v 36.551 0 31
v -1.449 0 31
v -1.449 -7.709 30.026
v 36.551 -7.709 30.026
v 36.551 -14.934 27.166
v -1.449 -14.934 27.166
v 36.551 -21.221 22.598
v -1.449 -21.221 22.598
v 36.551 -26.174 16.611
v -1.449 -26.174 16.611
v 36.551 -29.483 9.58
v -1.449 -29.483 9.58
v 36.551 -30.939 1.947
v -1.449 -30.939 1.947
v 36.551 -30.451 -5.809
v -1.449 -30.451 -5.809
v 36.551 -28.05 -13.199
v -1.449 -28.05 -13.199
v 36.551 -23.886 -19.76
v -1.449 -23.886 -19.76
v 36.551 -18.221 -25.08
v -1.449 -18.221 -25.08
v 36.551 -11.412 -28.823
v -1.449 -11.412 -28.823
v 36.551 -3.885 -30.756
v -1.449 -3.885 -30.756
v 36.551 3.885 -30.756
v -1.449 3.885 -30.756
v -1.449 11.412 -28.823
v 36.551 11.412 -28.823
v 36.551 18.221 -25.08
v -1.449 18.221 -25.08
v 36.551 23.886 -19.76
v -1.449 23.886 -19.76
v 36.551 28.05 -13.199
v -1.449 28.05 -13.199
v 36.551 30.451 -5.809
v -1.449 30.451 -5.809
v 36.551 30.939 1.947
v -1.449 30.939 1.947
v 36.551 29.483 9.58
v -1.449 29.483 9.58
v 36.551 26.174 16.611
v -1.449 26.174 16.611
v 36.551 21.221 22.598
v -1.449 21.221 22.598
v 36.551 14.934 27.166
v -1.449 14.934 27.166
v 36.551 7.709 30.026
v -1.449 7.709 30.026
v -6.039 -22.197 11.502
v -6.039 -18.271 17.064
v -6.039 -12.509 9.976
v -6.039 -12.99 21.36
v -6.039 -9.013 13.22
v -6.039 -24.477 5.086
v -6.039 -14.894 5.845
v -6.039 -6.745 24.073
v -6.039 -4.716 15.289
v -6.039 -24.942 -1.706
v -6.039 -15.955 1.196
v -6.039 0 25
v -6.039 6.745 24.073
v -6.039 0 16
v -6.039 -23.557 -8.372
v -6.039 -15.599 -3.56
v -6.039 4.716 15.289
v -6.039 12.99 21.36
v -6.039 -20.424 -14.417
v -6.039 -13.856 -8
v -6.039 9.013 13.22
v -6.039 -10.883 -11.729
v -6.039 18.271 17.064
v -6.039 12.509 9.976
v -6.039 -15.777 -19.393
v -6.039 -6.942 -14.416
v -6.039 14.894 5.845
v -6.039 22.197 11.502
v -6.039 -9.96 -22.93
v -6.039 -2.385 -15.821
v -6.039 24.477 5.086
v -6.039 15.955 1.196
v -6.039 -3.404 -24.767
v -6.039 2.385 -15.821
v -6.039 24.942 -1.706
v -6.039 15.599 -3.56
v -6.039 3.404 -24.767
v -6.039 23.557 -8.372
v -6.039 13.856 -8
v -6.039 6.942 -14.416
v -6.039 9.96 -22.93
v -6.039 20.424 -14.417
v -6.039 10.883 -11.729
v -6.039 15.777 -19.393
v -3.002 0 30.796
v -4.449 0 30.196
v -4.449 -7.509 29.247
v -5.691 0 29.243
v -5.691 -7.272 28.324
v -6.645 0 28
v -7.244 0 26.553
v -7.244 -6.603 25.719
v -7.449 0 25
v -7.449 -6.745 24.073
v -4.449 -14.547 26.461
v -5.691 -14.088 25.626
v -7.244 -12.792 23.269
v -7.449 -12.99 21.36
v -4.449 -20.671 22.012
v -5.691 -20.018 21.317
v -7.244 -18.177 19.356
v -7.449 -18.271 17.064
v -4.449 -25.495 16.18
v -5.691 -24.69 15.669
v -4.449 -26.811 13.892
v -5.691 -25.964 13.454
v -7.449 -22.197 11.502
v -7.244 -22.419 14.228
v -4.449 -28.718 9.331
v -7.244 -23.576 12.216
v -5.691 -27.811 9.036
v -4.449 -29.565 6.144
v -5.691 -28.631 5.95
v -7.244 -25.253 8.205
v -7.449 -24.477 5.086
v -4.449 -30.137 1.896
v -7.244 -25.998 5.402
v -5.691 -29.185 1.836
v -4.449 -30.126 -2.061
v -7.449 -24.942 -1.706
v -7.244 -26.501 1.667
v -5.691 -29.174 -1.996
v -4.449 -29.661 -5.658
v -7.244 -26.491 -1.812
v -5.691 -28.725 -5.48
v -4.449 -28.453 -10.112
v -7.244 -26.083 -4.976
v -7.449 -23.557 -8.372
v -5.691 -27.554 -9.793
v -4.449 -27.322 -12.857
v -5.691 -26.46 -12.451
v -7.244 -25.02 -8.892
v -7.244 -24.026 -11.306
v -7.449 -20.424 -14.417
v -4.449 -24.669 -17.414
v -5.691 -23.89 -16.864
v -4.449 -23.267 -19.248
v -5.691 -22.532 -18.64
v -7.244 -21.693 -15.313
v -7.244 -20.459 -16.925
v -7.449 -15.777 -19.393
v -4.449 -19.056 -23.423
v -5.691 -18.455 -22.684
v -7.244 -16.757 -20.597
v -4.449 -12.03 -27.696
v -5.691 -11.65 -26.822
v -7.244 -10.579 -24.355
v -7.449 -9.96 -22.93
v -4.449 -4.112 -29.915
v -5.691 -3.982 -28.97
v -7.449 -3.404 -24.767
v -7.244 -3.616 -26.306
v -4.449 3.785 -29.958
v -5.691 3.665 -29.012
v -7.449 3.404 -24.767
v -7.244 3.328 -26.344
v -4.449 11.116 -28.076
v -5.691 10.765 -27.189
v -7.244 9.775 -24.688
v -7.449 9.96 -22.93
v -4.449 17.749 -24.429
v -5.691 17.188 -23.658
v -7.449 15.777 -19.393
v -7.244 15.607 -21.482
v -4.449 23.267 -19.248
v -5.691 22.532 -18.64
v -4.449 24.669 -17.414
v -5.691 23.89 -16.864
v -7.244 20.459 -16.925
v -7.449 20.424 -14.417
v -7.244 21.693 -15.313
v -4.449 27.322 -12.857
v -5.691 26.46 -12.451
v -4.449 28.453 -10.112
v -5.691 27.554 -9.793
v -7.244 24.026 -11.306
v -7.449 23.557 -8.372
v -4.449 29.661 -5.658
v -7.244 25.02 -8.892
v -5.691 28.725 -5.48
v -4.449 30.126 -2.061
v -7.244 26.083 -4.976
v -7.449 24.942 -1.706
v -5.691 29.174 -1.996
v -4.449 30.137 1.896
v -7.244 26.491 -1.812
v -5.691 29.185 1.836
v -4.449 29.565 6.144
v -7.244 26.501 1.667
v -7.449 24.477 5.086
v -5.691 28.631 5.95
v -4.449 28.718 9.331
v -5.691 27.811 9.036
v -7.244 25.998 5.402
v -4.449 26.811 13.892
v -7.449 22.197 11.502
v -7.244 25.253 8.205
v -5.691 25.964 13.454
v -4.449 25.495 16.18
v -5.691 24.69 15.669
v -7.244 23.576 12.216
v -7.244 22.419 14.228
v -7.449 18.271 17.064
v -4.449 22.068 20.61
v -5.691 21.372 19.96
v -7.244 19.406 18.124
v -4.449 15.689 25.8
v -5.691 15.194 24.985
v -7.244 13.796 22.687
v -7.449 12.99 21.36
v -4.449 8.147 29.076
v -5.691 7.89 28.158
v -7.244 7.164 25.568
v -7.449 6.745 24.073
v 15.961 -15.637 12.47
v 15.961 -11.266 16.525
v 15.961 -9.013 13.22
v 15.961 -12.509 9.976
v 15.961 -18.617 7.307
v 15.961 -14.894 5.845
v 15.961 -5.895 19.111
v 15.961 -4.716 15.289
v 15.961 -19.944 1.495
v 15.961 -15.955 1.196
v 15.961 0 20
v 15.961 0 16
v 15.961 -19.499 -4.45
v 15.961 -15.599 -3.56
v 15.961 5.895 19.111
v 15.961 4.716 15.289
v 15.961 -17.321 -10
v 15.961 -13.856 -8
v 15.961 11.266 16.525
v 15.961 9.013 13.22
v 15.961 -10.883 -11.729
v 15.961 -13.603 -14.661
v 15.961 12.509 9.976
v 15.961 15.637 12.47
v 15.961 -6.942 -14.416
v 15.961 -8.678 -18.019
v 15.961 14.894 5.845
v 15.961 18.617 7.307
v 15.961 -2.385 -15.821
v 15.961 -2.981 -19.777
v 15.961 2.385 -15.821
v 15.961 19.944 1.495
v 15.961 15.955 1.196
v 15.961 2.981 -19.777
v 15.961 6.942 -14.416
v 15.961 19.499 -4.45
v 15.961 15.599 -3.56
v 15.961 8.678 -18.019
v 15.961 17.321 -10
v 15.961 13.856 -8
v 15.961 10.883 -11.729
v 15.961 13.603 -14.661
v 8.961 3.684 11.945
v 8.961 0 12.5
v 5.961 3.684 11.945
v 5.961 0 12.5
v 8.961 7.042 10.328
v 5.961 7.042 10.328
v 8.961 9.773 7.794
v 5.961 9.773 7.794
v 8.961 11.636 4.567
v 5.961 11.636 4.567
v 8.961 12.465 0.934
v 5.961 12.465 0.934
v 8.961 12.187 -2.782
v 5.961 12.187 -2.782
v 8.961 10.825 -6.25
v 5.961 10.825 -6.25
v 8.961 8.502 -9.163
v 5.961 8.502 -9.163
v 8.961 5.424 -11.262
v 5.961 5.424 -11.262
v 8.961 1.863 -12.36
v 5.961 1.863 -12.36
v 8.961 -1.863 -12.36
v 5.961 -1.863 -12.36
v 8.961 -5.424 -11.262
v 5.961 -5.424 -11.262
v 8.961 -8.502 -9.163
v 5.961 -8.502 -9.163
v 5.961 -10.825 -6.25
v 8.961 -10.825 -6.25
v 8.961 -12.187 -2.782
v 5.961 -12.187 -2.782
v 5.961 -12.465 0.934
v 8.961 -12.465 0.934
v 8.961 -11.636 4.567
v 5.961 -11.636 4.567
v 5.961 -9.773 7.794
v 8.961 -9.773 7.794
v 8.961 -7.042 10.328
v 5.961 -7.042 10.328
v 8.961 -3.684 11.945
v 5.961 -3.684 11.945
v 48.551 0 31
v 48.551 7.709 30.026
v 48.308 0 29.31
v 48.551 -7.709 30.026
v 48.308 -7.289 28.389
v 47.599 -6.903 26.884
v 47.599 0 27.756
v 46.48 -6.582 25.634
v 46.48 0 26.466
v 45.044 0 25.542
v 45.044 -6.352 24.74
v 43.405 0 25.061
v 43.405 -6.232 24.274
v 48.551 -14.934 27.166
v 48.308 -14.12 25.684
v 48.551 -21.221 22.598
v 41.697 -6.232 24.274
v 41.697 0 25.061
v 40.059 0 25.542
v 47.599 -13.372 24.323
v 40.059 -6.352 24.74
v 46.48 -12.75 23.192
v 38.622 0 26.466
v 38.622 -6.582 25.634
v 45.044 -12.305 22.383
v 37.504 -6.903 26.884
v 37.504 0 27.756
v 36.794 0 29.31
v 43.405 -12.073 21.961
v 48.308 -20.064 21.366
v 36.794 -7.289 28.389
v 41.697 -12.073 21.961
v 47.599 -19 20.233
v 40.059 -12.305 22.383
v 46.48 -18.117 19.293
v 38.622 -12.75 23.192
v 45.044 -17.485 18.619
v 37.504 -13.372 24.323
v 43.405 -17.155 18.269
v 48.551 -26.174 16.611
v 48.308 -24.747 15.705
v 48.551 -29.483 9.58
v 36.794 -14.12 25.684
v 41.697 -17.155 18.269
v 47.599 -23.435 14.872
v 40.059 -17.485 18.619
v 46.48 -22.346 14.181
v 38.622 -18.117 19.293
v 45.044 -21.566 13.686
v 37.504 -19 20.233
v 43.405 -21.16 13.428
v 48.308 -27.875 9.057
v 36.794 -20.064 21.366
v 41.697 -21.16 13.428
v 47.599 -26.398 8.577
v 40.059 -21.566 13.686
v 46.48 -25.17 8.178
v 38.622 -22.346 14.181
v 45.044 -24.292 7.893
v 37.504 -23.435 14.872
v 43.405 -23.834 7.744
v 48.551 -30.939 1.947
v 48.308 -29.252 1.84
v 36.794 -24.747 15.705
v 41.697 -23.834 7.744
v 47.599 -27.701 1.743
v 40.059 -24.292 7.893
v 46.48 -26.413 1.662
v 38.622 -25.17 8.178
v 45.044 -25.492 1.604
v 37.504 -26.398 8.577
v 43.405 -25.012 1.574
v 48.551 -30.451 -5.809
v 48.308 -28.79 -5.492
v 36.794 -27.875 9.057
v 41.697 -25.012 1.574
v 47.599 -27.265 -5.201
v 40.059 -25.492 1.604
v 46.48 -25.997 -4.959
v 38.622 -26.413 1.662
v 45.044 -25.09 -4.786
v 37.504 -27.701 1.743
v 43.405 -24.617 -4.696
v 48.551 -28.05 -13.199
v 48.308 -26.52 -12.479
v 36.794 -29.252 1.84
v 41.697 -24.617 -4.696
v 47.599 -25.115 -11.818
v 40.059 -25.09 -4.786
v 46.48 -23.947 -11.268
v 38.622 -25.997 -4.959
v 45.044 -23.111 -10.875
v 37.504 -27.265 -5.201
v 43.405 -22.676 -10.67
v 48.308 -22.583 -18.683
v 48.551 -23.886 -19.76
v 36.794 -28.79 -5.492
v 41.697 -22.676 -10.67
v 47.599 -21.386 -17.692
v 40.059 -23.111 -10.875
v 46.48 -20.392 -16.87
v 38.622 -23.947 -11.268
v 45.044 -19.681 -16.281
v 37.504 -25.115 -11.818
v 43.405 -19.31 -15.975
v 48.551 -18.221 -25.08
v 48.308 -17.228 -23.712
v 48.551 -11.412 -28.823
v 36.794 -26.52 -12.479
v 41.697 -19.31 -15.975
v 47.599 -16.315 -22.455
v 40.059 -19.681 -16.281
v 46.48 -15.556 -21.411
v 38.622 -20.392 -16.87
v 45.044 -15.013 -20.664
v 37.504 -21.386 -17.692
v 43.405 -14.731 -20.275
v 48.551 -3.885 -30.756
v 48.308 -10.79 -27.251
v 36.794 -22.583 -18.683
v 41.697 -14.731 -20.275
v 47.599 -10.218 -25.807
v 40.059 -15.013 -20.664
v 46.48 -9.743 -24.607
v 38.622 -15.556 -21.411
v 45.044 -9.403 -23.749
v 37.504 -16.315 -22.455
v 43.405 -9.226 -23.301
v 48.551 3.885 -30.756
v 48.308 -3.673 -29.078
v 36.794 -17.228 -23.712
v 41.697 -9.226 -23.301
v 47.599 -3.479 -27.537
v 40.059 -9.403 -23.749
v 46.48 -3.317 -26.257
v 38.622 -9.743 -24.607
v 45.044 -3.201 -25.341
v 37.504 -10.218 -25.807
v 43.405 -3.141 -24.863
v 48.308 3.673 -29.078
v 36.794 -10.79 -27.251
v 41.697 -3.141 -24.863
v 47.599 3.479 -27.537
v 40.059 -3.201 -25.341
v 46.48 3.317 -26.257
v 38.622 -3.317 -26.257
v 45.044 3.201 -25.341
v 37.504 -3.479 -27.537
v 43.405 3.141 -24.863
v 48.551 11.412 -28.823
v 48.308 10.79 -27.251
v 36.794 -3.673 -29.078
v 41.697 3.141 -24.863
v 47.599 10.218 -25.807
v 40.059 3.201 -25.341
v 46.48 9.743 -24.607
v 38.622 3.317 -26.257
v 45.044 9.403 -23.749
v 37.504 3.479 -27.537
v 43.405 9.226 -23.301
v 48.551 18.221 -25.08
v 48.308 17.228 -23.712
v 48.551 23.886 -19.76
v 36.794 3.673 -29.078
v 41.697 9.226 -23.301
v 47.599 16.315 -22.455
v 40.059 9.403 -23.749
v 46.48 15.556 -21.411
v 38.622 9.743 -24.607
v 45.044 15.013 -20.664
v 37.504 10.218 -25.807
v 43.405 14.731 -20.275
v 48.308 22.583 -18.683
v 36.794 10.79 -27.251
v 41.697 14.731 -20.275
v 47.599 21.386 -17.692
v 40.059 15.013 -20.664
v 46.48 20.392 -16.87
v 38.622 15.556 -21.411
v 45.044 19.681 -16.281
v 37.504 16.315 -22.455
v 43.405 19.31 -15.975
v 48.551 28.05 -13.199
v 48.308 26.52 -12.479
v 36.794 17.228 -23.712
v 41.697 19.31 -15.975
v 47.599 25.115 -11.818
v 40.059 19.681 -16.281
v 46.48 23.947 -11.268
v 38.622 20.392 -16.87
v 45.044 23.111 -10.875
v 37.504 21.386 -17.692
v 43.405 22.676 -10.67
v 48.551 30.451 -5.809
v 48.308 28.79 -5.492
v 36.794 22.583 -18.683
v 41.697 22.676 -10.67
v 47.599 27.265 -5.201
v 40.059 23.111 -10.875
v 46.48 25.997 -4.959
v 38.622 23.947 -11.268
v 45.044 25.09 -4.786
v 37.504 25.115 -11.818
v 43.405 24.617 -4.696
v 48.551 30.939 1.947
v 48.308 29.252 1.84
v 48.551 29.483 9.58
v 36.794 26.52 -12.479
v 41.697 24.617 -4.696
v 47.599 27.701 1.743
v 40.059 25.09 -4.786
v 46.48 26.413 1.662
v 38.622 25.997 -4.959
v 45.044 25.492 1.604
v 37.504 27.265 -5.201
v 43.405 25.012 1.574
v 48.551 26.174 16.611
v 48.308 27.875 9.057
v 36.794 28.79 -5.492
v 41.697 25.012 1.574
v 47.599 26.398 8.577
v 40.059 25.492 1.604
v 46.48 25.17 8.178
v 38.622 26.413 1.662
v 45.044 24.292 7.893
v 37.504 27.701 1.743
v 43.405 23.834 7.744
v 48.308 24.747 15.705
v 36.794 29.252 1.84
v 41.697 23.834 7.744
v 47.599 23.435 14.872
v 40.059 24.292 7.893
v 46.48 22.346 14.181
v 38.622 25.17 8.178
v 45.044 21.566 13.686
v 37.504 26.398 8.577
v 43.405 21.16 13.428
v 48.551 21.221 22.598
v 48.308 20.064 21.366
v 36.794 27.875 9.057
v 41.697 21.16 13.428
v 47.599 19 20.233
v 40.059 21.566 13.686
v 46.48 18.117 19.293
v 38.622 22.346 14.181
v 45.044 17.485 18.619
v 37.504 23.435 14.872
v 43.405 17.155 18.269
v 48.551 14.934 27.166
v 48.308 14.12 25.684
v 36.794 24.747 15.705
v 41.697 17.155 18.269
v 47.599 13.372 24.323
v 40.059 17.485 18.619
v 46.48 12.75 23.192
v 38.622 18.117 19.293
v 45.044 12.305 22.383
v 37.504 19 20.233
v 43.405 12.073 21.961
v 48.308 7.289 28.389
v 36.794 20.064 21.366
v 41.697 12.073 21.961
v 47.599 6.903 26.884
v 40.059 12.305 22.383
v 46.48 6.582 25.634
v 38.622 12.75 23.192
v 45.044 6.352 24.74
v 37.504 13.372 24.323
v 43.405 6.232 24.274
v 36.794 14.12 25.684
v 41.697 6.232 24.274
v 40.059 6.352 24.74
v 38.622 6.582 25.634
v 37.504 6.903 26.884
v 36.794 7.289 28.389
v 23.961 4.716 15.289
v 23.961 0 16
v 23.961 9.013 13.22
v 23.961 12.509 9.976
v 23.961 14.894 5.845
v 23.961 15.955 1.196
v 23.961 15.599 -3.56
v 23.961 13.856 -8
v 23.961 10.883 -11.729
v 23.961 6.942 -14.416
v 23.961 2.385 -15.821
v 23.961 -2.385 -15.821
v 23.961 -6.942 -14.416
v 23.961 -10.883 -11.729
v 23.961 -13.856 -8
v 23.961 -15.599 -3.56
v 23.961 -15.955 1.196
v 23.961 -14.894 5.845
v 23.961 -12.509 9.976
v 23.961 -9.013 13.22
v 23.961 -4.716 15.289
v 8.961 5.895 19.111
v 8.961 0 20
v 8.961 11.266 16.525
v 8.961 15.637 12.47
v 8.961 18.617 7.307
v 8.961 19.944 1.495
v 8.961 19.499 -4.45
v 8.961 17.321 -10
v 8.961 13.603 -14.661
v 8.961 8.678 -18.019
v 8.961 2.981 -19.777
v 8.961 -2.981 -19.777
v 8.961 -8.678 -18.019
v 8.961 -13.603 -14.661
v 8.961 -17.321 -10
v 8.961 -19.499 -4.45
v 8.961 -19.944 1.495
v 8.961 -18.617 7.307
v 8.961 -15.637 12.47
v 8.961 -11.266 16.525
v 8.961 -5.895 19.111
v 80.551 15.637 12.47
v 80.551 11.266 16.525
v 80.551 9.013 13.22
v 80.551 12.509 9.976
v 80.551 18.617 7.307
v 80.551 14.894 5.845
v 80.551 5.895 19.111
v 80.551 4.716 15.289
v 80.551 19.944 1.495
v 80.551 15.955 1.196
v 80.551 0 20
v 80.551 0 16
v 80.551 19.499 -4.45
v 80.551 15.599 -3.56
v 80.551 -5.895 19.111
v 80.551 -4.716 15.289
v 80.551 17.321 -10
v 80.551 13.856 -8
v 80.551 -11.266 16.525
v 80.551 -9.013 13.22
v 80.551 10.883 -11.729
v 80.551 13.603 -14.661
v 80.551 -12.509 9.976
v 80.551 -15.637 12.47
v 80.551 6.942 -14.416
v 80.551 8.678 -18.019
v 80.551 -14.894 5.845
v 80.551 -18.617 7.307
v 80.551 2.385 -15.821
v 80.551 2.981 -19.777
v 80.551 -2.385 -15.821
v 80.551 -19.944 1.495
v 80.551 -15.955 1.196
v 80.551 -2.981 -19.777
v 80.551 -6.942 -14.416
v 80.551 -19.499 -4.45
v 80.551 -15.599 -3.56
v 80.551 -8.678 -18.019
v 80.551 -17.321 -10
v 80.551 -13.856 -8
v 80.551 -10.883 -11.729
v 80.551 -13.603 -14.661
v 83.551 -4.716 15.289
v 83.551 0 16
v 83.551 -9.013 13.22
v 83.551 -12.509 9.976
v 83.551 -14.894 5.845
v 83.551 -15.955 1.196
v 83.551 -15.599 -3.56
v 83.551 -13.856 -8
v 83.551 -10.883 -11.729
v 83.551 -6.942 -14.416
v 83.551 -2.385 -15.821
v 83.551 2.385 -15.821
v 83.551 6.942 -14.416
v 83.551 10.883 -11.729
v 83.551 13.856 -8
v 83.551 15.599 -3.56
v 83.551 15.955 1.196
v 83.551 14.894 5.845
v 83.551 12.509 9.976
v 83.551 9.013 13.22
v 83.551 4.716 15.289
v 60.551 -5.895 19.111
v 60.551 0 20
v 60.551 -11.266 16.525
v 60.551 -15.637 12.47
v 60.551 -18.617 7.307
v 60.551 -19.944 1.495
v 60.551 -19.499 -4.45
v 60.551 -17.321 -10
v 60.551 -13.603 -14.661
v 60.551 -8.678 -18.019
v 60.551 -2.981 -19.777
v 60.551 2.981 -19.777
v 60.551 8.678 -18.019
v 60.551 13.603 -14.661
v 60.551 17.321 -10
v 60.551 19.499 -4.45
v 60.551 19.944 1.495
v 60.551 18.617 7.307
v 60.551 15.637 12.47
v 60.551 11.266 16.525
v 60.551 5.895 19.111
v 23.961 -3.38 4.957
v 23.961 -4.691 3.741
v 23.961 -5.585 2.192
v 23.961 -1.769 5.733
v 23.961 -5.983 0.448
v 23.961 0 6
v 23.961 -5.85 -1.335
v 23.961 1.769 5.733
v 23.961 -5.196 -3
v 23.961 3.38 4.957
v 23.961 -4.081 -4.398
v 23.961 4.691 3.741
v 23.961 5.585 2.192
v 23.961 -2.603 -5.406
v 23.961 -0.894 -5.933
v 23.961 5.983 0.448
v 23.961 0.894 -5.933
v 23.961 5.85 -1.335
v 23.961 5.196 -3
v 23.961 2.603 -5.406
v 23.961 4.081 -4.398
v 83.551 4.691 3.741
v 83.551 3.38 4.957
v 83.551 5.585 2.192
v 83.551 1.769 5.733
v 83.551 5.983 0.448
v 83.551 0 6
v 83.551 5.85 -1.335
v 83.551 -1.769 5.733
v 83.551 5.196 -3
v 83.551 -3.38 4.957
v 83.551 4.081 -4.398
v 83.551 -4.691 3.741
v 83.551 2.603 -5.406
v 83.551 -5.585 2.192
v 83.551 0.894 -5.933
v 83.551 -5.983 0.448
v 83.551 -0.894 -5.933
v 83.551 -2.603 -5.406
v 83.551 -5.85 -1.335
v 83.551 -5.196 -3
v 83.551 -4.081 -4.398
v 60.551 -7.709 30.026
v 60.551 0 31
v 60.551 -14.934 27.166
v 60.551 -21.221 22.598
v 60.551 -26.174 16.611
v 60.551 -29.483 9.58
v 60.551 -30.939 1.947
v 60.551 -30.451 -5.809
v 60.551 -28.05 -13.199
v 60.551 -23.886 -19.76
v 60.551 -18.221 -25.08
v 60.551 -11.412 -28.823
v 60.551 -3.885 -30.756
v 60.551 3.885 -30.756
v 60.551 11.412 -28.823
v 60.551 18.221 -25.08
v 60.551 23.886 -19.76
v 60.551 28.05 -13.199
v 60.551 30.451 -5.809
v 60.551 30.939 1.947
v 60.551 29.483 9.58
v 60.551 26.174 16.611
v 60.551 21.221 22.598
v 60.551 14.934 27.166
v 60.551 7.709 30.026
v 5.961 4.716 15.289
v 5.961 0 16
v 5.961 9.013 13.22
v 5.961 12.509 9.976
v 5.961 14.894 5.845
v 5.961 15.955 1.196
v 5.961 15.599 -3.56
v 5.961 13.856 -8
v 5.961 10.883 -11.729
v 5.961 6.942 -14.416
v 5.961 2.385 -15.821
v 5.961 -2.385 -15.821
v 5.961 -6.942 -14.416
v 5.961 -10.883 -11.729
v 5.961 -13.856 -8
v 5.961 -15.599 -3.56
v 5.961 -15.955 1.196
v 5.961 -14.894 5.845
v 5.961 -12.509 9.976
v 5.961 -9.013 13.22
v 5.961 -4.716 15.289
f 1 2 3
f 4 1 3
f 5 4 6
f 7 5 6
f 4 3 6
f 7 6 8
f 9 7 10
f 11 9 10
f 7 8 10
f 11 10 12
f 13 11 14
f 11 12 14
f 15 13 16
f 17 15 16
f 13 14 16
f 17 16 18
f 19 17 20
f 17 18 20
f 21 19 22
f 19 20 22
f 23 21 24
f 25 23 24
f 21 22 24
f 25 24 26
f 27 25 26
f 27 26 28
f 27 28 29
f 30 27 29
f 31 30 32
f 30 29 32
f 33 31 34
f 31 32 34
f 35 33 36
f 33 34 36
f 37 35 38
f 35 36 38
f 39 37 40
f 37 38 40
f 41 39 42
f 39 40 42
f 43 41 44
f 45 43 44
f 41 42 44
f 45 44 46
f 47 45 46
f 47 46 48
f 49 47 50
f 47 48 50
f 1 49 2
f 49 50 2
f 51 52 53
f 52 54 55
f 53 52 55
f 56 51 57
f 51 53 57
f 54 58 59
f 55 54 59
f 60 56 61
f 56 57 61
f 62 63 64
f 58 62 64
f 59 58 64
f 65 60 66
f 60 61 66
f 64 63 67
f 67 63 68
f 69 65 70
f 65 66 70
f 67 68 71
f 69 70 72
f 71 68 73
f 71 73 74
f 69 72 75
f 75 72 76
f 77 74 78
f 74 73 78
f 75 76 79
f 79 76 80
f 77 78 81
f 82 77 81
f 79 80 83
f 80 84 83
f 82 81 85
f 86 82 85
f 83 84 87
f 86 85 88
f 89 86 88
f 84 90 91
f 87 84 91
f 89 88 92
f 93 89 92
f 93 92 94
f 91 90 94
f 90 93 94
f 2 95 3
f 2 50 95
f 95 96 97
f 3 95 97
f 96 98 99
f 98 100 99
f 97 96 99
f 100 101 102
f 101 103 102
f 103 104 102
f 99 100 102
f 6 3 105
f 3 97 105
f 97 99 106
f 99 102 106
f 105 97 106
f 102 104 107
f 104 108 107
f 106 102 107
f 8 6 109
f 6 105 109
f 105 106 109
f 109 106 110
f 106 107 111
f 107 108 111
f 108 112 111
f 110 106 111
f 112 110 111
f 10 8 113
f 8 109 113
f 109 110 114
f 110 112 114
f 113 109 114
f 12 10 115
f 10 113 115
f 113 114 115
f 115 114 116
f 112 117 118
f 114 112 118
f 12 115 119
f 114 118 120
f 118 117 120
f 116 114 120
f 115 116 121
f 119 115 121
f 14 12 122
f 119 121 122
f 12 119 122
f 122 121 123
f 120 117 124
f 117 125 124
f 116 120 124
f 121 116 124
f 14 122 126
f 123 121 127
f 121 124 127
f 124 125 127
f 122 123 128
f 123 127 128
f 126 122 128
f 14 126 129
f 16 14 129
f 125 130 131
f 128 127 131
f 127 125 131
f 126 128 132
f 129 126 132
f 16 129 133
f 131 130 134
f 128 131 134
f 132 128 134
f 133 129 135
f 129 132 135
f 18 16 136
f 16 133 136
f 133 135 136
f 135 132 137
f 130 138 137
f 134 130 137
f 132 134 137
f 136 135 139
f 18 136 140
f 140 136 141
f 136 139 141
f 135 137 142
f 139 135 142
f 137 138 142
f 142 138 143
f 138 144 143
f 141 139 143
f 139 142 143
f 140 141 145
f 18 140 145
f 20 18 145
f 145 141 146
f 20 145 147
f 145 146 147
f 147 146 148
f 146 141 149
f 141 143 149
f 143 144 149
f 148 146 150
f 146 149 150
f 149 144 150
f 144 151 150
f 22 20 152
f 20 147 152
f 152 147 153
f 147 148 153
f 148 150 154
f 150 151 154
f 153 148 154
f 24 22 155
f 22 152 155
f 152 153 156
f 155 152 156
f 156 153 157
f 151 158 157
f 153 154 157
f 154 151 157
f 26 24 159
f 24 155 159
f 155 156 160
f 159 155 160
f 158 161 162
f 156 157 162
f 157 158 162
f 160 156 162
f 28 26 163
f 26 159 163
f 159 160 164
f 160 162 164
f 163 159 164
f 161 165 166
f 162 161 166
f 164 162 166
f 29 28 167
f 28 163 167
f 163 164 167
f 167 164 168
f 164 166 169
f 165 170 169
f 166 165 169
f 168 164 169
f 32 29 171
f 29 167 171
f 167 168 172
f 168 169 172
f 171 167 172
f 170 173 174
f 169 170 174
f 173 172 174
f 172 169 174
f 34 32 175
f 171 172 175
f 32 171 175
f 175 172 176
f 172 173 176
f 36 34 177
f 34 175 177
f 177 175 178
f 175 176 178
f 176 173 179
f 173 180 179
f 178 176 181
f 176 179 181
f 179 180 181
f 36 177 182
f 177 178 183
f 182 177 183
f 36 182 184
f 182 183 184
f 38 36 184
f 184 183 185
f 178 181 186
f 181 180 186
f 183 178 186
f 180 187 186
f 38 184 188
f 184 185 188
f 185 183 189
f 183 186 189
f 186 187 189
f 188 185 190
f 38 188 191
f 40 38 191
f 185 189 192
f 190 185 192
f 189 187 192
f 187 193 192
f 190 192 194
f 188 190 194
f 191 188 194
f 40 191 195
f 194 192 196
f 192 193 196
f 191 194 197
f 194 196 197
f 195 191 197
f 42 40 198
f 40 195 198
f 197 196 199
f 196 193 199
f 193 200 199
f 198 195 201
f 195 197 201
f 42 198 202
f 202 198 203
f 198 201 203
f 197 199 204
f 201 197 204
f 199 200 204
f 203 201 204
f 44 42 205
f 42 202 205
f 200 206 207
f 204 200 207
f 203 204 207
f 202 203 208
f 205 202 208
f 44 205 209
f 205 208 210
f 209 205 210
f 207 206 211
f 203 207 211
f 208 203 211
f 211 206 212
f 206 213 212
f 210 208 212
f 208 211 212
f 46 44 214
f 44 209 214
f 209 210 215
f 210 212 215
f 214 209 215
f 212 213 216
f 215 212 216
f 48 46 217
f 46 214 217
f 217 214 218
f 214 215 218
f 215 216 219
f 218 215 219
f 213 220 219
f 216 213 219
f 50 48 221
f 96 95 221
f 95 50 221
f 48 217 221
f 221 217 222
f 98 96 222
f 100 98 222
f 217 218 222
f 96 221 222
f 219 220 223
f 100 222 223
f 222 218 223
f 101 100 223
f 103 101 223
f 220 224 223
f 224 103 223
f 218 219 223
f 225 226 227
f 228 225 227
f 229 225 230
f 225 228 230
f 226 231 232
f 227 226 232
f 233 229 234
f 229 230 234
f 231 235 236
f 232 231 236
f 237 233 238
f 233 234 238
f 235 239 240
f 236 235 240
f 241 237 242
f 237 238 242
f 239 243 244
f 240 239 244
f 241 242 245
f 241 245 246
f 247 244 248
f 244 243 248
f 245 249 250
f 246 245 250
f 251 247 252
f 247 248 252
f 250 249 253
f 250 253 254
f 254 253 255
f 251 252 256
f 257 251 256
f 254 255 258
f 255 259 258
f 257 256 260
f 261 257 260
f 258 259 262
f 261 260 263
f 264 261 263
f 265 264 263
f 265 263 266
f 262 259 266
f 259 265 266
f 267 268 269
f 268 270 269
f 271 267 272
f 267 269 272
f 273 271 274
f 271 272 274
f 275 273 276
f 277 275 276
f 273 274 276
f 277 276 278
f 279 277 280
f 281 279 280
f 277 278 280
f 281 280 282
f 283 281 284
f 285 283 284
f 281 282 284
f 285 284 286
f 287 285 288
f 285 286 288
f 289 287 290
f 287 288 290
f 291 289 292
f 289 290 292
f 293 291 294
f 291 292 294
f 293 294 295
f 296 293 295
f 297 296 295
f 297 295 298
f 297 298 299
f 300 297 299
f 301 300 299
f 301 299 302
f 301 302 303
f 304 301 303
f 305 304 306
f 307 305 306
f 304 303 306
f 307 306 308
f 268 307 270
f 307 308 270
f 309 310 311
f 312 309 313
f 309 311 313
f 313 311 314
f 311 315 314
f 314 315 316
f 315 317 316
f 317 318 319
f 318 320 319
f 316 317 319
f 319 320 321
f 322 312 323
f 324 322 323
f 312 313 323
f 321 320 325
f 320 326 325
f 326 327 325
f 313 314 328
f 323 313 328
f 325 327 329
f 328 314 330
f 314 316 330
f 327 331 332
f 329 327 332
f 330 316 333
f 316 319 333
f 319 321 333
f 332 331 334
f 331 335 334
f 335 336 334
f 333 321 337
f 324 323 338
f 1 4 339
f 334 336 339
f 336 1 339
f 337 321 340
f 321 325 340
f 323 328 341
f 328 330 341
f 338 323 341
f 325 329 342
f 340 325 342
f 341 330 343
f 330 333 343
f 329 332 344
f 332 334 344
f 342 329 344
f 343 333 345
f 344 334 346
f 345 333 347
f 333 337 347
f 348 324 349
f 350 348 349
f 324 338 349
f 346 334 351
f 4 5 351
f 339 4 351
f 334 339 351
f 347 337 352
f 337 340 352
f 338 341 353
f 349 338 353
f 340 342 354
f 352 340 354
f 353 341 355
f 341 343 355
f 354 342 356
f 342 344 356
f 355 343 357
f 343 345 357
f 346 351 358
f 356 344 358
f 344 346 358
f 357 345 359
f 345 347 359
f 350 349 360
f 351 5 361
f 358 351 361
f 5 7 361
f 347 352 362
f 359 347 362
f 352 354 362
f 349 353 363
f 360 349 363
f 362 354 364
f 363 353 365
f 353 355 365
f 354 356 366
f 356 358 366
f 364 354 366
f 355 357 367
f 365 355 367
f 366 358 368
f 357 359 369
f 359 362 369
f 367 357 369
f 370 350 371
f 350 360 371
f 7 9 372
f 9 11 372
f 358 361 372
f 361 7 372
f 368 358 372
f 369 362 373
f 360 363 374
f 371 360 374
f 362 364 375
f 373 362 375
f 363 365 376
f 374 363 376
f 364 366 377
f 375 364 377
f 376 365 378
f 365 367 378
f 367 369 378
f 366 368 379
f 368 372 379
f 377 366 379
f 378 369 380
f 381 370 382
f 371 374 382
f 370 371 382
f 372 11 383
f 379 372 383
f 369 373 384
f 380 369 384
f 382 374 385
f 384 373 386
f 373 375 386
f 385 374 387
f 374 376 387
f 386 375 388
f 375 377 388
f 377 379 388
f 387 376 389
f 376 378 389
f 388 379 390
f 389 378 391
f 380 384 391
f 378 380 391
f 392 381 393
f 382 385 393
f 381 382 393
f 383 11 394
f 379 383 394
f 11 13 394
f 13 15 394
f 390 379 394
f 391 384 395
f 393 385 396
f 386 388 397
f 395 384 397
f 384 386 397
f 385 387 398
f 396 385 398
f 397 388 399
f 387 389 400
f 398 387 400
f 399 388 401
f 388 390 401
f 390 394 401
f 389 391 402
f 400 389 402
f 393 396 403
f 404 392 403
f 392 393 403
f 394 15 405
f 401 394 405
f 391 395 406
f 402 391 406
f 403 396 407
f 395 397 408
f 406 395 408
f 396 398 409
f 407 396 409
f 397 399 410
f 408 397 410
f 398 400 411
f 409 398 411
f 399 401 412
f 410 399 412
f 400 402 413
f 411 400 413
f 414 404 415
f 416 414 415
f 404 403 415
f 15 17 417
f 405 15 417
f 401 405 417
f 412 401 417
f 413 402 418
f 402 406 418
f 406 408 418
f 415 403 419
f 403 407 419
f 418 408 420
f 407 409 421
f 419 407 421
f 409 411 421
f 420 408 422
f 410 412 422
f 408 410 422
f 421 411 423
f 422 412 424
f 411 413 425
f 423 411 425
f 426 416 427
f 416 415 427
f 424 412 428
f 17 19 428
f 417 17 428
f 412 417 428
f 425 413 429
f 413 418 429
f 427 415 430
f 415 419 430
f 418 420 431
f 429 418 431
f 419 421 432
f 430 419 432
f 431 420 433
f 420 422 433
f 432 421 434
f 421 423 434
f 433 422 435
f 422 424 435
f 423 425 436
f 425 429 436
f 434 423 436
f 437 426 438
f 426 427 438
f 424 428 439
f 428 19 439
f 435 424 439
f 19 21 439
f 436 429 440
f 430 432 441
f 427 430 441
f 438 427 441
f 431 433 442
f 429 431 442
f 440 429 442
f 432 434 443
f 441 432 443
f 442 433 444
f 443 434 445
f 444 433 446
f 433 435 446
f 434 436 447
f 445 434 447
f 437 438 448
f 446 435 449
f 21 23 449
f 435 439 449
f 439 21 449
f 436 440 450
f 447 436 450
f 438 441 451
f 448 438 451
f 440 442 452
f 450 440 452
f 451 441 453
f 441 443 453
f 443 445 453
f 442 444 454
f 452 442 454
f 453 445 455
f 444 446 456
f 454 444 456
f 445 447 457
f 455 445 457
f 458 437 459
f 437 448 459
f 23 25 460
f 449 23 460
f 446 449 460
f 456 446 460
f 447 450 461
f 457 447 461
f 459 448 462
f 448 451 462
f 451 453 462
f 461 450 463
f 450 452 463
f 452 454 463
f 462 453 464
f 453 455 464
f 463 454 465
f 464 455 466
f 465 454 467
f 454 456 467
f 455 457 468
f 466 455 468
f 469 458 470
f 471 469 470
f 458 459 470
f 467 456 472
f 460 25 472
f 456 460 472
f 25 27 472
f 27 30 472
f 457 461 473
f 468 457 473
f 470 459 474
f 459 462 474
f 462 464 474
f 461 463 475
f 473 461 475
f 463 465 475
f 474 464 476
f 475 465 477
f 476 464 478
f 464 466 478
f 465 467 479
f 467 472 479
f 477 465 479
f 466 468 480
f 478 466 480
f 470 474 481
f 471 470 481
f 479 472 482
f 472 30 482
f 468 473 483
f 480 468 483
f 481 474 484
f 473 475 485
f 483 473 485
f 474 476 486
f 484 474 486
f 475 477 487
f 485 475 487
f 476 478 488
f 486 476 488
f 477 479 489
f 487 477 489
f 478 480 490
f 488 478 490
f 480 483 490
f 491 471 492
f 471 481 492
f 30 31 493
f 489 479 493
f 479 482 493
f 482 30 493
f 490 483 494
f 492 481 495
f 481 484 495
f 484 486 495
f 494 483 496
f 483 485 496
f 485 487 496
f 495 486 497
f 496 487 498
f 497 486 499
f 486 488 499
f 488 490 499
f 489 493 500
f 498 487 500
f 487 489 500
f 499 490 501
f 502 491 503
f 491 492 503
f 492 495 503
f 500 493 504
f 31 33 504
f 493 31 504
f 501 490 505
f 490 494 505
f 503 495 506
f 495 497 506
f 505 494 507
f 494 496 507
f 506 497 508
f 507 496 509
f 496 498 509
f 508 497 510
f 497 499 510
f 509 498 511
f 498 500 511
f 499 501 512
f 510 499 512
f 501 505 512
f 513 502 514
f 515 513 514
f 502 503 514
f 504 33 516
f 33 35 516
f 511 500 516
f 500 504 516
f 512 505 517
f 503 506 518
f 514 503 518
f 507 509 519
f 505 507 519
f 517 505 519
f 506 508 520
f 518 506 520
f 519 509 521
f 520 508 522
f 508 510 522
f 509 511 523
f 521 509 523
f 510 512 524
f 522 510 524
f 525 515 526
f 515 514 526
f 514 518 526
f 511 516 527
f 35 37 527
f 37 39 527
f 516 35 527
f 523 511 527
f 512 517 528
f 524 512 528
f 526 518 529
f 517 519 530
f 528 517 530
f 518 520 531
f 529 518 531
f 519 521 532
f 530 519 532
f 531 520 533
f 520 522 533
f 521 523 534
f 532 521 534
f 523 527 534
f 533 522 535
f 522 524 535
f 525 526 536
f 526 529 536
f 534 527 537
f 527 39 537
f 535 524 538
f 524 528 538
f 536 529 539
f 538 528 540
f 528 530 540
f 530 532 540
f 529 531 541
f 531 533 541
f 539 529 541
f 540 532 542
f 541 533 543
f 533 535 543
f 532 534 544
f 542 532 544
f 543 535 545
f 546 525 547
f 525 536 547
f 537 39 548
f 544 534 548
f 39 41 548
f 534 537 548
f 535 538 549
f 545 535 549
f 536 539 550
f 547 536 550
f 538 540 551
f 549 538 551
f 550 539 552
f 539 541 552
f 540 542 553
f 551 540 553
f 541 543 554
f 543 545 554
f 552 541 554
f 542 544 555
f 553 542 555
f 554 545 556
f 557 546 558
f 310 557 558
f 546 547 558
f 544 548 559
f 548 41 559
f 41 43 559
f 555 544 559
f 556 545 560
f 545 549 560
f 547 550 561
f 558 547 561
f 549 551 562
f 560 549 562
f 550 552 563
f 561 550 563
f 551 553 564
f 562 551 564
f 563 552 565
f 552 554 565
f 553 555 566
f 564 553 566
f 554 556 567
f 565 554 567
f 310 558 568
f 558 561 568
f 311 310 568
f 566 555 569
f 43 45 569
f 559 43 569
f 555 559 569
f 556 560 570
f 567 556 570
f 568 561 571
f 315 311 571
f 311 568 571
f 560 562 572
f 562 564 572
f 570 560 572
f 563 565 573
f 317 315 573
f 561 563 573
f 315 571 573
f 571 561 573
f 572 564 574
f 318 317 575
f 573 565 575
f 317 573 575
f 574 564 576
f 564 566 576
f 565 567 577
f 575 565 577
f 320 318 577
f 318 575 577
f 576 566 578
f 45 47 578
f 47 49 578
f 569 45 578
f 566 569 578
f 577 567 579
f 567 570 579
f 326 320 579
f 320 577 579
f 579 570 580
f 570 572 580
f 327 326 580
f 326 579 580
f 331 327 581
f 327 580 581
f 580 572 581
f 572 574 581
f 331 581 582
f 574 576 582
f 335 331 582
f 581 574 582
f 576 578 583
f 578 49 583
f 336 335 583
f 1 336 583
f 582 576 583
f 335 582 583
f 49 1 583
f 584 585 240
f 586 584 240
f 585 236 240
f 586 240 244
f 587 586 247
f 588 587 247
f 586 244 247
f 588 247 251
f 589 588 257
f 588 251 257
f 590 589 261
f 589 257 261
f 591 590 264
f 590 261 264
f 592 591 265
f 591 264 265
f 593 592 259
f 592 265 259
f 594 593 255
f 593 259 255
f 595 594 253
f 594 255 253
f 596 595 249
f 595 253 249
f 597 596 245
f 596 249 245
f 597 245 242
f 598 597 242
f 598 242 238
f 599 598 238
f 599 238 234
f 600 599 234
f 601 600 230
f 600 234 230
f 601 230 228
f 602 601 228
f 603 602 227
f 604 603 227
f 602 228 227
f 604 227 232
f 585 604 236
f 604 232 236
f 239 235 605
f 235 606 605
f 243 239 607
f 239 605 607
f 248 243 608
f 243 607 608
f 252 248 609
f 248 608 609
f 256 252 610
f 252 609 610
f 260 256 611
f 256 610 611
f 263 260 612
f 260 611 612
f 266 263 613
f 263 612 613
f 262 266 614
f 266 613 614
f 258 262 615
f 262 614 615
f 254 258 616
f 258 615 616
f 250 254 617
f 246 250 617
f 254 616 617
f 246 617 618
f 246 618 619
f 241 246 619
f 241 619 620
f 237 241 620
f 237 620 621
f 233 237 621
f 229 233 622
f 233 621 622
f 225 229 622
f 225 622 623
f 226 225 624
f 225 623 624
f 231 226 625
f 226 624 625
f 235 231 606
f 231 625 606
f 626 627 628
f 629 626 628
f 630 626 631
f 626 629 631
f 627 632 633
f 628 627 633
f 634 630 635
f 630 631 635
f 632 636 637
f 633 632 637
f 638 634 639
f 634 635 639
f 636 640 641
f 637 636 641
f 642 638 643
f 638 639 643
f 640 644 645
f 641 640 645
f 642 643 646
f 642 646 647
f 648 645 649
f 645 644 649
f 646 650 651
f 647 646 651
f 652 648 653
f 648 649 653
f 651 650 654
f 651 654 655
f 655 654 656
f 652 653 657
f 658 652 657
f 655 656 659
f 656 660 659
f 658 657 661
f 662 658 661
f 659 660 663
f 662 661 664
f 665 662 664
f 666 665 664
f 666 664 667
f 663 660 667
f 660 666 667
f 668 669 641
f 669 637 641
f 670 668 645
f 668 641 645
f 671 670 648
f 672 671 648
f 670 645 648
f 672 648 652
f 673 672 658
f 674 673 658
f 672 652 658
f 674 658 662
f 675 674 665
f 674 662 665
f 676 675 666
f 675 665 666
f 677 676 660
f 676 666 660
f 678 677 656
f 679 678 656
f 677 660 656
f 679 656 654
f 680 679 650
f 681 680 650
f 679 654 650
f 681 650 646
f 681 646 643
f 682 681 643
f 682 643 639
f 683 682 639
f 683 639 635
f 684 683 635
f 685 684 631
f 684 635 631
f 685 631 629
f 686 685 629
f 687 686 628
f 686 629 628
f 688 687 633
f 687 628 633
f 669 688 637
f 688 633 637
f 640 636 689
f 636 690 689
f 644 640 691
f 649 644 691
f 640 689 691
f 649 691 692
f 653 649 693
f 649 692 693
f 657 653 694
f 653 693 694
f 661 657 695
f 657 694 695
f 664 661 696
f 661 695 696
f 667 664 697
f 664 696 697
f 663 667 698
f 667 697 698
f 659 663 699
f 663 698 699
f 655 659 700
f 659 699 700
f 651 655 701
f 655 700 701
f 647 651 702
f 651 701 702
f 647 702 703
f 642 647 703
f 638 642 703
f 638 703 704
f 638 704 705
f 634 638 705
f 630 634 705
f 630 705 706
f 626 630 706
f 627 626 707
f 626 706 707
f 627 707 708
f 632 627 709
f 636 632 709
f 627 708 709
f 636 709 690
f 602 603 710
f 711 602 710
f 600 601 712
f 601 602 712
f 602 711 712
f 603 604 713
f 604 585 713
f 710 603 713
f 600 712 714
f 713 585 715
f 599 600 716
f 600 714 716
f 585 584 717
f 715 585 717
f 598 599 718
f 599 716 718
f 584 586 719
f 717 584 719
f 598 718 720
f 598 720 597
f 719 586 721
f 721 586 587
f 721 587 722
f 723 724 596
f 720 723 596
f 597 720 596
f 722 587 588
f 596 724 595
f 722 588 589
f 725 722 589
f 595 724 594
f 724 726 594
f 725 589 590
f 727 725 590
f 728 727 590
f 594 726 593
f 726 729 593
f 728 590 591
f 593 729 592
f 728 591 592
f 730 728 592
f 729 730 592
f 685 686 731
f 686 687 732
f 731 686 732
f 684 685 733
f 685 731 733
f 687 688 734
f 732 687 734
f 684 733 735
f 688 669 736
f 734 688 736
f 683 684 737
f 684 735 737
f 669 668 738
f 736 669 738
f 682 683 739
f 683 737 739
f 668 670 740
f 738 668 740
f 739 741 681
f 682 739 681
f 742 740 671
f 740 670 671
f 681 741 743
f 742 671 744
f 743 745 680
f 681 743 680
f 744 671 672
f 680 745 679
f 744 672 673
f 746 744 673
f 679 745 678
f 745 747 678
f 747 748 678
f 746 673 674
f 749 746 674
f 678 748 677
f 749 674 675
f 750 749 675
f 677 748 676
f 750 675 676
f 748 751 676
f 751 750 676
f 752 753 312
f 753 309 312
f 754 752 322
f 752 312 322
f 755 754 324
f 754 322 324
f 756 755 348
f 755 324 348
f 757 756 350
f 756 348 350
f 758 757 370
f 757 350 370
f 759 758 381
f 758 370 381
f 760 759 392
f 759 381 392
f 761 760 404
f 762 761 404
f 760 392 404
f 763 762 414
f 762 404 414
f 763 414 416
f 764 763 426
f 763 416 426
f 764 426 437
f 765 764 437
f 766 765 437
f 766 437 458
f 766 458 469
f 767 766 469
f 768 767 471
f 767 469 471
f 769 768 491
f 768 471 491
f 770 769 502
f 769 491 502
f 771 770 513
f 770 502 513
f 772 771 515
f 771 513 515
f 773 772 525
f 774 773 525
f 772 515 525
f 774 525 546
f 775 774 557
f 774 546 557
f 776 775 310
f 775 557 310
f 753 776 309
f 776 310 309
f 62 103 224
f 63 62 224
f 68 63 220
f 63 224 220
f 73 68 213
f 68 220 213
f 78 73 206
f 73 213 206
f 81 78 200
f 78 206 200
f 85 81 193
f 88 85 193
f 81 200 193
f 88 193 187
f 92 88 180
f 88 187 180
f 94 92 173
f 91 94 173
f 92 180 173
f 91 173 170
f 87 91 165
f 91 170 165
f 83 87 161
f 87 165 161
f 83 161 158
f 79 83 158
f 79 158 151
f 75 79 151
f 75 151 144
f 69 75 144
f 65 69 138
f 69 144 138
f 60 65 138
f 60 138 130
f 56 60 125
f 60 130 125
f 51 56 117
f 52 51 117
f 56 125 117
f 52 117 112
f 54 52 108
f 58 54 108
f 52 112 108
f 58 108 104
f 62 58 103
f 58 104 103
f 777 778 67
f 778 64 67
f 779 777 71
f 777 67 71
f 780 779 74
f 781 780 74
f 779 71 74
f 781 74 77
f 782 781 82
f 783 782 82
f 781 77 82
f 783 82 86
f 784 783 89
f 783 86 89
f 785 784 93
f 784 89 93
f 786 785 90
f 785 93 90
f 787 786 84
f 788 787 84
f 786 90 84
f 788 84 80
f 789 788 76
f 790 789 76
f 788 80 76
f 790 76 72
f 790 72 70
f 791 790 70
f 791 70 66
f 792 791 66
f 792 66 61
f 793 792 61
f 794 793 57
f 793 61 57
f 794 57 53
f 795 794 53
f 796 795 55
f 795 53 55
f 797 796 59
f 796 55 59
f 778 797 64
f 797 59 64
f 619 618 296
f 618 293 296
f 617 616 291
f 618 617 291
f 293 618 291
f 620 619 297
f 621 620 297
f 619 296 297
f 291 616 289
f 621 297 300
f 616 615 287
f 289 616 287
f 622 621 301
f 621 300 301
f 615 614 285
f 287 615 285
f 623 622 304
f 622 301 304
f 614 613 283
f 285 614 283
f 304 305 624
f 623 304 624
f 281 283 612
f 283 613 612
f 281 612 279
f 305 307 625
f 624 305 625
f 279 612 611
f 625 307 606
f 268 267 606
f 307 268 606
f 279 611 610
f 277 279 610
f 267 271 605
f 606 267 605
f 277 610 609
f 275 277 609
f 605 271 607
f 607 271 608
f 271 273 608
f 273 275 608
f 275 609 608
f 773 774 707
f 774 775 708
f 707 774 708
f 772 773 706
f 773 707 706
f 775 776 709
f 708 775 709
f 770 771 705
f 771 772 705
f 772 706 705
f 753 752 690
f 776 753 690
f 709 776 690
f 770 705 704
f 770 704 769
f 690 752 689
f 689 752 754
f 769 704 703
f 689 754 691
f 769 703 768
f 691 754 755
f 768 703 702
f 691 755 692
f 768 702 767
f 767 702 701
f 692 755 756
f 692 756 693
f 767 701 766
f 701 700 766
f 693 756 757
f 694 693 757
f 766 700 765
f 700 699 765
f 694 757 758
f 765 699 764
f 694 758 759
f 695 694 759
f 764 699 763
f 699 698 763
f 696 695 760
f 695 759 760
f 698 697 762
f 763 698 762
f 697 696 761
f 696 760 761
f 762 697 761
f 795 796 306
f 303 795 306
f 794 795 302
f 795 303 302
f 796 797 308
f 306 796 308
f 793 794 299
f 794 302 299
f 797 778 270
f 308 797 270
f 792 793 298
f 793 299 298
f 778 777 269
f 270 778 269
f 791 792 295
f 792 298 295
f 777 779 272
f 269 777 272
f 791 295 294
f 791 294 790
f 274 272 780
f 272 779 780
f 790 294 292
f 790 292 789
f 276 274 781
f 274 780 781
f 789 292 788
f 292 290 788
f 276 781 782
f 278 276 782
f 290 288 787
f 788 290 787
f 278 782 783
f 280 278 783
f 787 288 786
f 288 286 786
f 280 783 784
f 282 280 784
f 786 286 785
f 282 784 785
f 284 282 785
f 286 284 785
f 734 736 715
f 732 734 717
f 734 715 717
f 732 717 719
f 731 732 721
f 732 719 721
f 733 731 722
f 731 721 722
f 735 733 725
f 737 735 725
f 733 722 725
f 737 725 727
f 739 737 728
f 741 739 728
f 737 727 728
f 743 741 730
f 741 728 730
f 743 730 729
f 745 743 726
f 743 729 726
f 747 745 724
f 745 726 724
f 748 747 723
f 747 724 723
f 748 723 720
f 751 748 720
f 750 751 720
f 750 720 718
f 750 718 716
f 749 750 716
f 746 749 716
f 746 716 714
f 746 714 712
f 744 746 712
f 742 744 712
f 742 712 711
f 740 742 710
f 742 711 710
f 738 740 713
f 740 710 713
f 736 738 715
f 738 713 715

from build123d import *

# Parameters (mm, degrees)
F4_R = 5.99999


# Not quite as in the source:
# - a fillet or chamfer is up to 0.001 mm smaller than in the source, because OpenCascade refuses the exact size


with BuildPart() as f1:
    # F0 (on Front) → F1 (revolve)
    with BuildSketch(Plane.XZ):
        with BuildLine():
            Line((-7.4487626523, 0), (0, 0))
            Line((0, 0), (83.5512373477, 0))
            Line((83.5512373477, 0), (83.5512373477, 16))
            Line((83.5512373477, 16), (80.5512373477, 16))
            Line((80.5512373477, 16), (80.5512373477, 20))
            Line((80.5512373477, 20), (60.5512373477, 20))
            Line((60.5512373477, 20), (60.5512373477, 31))
            Line((60.5512373477, 31), (48.5512373477, 31))
            ThreePointArc((48.5512373477, 31), (42.5512373477, 25), (36.5512373477, 31))
            Line((36.5512373477, 31), (-7.4487626523, 31))
            Line((-7.4487626523, 31), (-7.4487626523, 0))
        make_face()
    revolve(axis=Axis((38.0512373477, 0, 0), (1, 0, 0)))

    # F2 (on Front) → F3 (revolve, cut)
    with BuildSketch(Plane.XZ):
        Polygon((-8.5385272913, 25), (-8.5385272913, 0), (90.8953762729, 0), (90.8953762729, 6), (23.9614727087, 6), (23.9614727087, 16), (15.9614727087, 16), (15.9614727087, 20), (8.9614727087, 20), (8.9614727087, 12.5), (5.9614727087, 12.5), (5.9614727087, 16), (-6.0385272913, 16), (-6.0385272913, 25), align=None)
    revolve(axis=Axis((41.1784244908, 0, 0), (-1, 0, 0)), mode=Mode.SUBTRACT)

    # F4 (radius 6 in the source; OpenCascade refuses exactly that, so slightly less here)
    f4_edges = [f1.edges().sort_by_distance(p)[0] for p in [
        (-7.448763, 0, -31),
    ]]
    fillet(f4_edges, radius=F4_R)


solid = f1.part
